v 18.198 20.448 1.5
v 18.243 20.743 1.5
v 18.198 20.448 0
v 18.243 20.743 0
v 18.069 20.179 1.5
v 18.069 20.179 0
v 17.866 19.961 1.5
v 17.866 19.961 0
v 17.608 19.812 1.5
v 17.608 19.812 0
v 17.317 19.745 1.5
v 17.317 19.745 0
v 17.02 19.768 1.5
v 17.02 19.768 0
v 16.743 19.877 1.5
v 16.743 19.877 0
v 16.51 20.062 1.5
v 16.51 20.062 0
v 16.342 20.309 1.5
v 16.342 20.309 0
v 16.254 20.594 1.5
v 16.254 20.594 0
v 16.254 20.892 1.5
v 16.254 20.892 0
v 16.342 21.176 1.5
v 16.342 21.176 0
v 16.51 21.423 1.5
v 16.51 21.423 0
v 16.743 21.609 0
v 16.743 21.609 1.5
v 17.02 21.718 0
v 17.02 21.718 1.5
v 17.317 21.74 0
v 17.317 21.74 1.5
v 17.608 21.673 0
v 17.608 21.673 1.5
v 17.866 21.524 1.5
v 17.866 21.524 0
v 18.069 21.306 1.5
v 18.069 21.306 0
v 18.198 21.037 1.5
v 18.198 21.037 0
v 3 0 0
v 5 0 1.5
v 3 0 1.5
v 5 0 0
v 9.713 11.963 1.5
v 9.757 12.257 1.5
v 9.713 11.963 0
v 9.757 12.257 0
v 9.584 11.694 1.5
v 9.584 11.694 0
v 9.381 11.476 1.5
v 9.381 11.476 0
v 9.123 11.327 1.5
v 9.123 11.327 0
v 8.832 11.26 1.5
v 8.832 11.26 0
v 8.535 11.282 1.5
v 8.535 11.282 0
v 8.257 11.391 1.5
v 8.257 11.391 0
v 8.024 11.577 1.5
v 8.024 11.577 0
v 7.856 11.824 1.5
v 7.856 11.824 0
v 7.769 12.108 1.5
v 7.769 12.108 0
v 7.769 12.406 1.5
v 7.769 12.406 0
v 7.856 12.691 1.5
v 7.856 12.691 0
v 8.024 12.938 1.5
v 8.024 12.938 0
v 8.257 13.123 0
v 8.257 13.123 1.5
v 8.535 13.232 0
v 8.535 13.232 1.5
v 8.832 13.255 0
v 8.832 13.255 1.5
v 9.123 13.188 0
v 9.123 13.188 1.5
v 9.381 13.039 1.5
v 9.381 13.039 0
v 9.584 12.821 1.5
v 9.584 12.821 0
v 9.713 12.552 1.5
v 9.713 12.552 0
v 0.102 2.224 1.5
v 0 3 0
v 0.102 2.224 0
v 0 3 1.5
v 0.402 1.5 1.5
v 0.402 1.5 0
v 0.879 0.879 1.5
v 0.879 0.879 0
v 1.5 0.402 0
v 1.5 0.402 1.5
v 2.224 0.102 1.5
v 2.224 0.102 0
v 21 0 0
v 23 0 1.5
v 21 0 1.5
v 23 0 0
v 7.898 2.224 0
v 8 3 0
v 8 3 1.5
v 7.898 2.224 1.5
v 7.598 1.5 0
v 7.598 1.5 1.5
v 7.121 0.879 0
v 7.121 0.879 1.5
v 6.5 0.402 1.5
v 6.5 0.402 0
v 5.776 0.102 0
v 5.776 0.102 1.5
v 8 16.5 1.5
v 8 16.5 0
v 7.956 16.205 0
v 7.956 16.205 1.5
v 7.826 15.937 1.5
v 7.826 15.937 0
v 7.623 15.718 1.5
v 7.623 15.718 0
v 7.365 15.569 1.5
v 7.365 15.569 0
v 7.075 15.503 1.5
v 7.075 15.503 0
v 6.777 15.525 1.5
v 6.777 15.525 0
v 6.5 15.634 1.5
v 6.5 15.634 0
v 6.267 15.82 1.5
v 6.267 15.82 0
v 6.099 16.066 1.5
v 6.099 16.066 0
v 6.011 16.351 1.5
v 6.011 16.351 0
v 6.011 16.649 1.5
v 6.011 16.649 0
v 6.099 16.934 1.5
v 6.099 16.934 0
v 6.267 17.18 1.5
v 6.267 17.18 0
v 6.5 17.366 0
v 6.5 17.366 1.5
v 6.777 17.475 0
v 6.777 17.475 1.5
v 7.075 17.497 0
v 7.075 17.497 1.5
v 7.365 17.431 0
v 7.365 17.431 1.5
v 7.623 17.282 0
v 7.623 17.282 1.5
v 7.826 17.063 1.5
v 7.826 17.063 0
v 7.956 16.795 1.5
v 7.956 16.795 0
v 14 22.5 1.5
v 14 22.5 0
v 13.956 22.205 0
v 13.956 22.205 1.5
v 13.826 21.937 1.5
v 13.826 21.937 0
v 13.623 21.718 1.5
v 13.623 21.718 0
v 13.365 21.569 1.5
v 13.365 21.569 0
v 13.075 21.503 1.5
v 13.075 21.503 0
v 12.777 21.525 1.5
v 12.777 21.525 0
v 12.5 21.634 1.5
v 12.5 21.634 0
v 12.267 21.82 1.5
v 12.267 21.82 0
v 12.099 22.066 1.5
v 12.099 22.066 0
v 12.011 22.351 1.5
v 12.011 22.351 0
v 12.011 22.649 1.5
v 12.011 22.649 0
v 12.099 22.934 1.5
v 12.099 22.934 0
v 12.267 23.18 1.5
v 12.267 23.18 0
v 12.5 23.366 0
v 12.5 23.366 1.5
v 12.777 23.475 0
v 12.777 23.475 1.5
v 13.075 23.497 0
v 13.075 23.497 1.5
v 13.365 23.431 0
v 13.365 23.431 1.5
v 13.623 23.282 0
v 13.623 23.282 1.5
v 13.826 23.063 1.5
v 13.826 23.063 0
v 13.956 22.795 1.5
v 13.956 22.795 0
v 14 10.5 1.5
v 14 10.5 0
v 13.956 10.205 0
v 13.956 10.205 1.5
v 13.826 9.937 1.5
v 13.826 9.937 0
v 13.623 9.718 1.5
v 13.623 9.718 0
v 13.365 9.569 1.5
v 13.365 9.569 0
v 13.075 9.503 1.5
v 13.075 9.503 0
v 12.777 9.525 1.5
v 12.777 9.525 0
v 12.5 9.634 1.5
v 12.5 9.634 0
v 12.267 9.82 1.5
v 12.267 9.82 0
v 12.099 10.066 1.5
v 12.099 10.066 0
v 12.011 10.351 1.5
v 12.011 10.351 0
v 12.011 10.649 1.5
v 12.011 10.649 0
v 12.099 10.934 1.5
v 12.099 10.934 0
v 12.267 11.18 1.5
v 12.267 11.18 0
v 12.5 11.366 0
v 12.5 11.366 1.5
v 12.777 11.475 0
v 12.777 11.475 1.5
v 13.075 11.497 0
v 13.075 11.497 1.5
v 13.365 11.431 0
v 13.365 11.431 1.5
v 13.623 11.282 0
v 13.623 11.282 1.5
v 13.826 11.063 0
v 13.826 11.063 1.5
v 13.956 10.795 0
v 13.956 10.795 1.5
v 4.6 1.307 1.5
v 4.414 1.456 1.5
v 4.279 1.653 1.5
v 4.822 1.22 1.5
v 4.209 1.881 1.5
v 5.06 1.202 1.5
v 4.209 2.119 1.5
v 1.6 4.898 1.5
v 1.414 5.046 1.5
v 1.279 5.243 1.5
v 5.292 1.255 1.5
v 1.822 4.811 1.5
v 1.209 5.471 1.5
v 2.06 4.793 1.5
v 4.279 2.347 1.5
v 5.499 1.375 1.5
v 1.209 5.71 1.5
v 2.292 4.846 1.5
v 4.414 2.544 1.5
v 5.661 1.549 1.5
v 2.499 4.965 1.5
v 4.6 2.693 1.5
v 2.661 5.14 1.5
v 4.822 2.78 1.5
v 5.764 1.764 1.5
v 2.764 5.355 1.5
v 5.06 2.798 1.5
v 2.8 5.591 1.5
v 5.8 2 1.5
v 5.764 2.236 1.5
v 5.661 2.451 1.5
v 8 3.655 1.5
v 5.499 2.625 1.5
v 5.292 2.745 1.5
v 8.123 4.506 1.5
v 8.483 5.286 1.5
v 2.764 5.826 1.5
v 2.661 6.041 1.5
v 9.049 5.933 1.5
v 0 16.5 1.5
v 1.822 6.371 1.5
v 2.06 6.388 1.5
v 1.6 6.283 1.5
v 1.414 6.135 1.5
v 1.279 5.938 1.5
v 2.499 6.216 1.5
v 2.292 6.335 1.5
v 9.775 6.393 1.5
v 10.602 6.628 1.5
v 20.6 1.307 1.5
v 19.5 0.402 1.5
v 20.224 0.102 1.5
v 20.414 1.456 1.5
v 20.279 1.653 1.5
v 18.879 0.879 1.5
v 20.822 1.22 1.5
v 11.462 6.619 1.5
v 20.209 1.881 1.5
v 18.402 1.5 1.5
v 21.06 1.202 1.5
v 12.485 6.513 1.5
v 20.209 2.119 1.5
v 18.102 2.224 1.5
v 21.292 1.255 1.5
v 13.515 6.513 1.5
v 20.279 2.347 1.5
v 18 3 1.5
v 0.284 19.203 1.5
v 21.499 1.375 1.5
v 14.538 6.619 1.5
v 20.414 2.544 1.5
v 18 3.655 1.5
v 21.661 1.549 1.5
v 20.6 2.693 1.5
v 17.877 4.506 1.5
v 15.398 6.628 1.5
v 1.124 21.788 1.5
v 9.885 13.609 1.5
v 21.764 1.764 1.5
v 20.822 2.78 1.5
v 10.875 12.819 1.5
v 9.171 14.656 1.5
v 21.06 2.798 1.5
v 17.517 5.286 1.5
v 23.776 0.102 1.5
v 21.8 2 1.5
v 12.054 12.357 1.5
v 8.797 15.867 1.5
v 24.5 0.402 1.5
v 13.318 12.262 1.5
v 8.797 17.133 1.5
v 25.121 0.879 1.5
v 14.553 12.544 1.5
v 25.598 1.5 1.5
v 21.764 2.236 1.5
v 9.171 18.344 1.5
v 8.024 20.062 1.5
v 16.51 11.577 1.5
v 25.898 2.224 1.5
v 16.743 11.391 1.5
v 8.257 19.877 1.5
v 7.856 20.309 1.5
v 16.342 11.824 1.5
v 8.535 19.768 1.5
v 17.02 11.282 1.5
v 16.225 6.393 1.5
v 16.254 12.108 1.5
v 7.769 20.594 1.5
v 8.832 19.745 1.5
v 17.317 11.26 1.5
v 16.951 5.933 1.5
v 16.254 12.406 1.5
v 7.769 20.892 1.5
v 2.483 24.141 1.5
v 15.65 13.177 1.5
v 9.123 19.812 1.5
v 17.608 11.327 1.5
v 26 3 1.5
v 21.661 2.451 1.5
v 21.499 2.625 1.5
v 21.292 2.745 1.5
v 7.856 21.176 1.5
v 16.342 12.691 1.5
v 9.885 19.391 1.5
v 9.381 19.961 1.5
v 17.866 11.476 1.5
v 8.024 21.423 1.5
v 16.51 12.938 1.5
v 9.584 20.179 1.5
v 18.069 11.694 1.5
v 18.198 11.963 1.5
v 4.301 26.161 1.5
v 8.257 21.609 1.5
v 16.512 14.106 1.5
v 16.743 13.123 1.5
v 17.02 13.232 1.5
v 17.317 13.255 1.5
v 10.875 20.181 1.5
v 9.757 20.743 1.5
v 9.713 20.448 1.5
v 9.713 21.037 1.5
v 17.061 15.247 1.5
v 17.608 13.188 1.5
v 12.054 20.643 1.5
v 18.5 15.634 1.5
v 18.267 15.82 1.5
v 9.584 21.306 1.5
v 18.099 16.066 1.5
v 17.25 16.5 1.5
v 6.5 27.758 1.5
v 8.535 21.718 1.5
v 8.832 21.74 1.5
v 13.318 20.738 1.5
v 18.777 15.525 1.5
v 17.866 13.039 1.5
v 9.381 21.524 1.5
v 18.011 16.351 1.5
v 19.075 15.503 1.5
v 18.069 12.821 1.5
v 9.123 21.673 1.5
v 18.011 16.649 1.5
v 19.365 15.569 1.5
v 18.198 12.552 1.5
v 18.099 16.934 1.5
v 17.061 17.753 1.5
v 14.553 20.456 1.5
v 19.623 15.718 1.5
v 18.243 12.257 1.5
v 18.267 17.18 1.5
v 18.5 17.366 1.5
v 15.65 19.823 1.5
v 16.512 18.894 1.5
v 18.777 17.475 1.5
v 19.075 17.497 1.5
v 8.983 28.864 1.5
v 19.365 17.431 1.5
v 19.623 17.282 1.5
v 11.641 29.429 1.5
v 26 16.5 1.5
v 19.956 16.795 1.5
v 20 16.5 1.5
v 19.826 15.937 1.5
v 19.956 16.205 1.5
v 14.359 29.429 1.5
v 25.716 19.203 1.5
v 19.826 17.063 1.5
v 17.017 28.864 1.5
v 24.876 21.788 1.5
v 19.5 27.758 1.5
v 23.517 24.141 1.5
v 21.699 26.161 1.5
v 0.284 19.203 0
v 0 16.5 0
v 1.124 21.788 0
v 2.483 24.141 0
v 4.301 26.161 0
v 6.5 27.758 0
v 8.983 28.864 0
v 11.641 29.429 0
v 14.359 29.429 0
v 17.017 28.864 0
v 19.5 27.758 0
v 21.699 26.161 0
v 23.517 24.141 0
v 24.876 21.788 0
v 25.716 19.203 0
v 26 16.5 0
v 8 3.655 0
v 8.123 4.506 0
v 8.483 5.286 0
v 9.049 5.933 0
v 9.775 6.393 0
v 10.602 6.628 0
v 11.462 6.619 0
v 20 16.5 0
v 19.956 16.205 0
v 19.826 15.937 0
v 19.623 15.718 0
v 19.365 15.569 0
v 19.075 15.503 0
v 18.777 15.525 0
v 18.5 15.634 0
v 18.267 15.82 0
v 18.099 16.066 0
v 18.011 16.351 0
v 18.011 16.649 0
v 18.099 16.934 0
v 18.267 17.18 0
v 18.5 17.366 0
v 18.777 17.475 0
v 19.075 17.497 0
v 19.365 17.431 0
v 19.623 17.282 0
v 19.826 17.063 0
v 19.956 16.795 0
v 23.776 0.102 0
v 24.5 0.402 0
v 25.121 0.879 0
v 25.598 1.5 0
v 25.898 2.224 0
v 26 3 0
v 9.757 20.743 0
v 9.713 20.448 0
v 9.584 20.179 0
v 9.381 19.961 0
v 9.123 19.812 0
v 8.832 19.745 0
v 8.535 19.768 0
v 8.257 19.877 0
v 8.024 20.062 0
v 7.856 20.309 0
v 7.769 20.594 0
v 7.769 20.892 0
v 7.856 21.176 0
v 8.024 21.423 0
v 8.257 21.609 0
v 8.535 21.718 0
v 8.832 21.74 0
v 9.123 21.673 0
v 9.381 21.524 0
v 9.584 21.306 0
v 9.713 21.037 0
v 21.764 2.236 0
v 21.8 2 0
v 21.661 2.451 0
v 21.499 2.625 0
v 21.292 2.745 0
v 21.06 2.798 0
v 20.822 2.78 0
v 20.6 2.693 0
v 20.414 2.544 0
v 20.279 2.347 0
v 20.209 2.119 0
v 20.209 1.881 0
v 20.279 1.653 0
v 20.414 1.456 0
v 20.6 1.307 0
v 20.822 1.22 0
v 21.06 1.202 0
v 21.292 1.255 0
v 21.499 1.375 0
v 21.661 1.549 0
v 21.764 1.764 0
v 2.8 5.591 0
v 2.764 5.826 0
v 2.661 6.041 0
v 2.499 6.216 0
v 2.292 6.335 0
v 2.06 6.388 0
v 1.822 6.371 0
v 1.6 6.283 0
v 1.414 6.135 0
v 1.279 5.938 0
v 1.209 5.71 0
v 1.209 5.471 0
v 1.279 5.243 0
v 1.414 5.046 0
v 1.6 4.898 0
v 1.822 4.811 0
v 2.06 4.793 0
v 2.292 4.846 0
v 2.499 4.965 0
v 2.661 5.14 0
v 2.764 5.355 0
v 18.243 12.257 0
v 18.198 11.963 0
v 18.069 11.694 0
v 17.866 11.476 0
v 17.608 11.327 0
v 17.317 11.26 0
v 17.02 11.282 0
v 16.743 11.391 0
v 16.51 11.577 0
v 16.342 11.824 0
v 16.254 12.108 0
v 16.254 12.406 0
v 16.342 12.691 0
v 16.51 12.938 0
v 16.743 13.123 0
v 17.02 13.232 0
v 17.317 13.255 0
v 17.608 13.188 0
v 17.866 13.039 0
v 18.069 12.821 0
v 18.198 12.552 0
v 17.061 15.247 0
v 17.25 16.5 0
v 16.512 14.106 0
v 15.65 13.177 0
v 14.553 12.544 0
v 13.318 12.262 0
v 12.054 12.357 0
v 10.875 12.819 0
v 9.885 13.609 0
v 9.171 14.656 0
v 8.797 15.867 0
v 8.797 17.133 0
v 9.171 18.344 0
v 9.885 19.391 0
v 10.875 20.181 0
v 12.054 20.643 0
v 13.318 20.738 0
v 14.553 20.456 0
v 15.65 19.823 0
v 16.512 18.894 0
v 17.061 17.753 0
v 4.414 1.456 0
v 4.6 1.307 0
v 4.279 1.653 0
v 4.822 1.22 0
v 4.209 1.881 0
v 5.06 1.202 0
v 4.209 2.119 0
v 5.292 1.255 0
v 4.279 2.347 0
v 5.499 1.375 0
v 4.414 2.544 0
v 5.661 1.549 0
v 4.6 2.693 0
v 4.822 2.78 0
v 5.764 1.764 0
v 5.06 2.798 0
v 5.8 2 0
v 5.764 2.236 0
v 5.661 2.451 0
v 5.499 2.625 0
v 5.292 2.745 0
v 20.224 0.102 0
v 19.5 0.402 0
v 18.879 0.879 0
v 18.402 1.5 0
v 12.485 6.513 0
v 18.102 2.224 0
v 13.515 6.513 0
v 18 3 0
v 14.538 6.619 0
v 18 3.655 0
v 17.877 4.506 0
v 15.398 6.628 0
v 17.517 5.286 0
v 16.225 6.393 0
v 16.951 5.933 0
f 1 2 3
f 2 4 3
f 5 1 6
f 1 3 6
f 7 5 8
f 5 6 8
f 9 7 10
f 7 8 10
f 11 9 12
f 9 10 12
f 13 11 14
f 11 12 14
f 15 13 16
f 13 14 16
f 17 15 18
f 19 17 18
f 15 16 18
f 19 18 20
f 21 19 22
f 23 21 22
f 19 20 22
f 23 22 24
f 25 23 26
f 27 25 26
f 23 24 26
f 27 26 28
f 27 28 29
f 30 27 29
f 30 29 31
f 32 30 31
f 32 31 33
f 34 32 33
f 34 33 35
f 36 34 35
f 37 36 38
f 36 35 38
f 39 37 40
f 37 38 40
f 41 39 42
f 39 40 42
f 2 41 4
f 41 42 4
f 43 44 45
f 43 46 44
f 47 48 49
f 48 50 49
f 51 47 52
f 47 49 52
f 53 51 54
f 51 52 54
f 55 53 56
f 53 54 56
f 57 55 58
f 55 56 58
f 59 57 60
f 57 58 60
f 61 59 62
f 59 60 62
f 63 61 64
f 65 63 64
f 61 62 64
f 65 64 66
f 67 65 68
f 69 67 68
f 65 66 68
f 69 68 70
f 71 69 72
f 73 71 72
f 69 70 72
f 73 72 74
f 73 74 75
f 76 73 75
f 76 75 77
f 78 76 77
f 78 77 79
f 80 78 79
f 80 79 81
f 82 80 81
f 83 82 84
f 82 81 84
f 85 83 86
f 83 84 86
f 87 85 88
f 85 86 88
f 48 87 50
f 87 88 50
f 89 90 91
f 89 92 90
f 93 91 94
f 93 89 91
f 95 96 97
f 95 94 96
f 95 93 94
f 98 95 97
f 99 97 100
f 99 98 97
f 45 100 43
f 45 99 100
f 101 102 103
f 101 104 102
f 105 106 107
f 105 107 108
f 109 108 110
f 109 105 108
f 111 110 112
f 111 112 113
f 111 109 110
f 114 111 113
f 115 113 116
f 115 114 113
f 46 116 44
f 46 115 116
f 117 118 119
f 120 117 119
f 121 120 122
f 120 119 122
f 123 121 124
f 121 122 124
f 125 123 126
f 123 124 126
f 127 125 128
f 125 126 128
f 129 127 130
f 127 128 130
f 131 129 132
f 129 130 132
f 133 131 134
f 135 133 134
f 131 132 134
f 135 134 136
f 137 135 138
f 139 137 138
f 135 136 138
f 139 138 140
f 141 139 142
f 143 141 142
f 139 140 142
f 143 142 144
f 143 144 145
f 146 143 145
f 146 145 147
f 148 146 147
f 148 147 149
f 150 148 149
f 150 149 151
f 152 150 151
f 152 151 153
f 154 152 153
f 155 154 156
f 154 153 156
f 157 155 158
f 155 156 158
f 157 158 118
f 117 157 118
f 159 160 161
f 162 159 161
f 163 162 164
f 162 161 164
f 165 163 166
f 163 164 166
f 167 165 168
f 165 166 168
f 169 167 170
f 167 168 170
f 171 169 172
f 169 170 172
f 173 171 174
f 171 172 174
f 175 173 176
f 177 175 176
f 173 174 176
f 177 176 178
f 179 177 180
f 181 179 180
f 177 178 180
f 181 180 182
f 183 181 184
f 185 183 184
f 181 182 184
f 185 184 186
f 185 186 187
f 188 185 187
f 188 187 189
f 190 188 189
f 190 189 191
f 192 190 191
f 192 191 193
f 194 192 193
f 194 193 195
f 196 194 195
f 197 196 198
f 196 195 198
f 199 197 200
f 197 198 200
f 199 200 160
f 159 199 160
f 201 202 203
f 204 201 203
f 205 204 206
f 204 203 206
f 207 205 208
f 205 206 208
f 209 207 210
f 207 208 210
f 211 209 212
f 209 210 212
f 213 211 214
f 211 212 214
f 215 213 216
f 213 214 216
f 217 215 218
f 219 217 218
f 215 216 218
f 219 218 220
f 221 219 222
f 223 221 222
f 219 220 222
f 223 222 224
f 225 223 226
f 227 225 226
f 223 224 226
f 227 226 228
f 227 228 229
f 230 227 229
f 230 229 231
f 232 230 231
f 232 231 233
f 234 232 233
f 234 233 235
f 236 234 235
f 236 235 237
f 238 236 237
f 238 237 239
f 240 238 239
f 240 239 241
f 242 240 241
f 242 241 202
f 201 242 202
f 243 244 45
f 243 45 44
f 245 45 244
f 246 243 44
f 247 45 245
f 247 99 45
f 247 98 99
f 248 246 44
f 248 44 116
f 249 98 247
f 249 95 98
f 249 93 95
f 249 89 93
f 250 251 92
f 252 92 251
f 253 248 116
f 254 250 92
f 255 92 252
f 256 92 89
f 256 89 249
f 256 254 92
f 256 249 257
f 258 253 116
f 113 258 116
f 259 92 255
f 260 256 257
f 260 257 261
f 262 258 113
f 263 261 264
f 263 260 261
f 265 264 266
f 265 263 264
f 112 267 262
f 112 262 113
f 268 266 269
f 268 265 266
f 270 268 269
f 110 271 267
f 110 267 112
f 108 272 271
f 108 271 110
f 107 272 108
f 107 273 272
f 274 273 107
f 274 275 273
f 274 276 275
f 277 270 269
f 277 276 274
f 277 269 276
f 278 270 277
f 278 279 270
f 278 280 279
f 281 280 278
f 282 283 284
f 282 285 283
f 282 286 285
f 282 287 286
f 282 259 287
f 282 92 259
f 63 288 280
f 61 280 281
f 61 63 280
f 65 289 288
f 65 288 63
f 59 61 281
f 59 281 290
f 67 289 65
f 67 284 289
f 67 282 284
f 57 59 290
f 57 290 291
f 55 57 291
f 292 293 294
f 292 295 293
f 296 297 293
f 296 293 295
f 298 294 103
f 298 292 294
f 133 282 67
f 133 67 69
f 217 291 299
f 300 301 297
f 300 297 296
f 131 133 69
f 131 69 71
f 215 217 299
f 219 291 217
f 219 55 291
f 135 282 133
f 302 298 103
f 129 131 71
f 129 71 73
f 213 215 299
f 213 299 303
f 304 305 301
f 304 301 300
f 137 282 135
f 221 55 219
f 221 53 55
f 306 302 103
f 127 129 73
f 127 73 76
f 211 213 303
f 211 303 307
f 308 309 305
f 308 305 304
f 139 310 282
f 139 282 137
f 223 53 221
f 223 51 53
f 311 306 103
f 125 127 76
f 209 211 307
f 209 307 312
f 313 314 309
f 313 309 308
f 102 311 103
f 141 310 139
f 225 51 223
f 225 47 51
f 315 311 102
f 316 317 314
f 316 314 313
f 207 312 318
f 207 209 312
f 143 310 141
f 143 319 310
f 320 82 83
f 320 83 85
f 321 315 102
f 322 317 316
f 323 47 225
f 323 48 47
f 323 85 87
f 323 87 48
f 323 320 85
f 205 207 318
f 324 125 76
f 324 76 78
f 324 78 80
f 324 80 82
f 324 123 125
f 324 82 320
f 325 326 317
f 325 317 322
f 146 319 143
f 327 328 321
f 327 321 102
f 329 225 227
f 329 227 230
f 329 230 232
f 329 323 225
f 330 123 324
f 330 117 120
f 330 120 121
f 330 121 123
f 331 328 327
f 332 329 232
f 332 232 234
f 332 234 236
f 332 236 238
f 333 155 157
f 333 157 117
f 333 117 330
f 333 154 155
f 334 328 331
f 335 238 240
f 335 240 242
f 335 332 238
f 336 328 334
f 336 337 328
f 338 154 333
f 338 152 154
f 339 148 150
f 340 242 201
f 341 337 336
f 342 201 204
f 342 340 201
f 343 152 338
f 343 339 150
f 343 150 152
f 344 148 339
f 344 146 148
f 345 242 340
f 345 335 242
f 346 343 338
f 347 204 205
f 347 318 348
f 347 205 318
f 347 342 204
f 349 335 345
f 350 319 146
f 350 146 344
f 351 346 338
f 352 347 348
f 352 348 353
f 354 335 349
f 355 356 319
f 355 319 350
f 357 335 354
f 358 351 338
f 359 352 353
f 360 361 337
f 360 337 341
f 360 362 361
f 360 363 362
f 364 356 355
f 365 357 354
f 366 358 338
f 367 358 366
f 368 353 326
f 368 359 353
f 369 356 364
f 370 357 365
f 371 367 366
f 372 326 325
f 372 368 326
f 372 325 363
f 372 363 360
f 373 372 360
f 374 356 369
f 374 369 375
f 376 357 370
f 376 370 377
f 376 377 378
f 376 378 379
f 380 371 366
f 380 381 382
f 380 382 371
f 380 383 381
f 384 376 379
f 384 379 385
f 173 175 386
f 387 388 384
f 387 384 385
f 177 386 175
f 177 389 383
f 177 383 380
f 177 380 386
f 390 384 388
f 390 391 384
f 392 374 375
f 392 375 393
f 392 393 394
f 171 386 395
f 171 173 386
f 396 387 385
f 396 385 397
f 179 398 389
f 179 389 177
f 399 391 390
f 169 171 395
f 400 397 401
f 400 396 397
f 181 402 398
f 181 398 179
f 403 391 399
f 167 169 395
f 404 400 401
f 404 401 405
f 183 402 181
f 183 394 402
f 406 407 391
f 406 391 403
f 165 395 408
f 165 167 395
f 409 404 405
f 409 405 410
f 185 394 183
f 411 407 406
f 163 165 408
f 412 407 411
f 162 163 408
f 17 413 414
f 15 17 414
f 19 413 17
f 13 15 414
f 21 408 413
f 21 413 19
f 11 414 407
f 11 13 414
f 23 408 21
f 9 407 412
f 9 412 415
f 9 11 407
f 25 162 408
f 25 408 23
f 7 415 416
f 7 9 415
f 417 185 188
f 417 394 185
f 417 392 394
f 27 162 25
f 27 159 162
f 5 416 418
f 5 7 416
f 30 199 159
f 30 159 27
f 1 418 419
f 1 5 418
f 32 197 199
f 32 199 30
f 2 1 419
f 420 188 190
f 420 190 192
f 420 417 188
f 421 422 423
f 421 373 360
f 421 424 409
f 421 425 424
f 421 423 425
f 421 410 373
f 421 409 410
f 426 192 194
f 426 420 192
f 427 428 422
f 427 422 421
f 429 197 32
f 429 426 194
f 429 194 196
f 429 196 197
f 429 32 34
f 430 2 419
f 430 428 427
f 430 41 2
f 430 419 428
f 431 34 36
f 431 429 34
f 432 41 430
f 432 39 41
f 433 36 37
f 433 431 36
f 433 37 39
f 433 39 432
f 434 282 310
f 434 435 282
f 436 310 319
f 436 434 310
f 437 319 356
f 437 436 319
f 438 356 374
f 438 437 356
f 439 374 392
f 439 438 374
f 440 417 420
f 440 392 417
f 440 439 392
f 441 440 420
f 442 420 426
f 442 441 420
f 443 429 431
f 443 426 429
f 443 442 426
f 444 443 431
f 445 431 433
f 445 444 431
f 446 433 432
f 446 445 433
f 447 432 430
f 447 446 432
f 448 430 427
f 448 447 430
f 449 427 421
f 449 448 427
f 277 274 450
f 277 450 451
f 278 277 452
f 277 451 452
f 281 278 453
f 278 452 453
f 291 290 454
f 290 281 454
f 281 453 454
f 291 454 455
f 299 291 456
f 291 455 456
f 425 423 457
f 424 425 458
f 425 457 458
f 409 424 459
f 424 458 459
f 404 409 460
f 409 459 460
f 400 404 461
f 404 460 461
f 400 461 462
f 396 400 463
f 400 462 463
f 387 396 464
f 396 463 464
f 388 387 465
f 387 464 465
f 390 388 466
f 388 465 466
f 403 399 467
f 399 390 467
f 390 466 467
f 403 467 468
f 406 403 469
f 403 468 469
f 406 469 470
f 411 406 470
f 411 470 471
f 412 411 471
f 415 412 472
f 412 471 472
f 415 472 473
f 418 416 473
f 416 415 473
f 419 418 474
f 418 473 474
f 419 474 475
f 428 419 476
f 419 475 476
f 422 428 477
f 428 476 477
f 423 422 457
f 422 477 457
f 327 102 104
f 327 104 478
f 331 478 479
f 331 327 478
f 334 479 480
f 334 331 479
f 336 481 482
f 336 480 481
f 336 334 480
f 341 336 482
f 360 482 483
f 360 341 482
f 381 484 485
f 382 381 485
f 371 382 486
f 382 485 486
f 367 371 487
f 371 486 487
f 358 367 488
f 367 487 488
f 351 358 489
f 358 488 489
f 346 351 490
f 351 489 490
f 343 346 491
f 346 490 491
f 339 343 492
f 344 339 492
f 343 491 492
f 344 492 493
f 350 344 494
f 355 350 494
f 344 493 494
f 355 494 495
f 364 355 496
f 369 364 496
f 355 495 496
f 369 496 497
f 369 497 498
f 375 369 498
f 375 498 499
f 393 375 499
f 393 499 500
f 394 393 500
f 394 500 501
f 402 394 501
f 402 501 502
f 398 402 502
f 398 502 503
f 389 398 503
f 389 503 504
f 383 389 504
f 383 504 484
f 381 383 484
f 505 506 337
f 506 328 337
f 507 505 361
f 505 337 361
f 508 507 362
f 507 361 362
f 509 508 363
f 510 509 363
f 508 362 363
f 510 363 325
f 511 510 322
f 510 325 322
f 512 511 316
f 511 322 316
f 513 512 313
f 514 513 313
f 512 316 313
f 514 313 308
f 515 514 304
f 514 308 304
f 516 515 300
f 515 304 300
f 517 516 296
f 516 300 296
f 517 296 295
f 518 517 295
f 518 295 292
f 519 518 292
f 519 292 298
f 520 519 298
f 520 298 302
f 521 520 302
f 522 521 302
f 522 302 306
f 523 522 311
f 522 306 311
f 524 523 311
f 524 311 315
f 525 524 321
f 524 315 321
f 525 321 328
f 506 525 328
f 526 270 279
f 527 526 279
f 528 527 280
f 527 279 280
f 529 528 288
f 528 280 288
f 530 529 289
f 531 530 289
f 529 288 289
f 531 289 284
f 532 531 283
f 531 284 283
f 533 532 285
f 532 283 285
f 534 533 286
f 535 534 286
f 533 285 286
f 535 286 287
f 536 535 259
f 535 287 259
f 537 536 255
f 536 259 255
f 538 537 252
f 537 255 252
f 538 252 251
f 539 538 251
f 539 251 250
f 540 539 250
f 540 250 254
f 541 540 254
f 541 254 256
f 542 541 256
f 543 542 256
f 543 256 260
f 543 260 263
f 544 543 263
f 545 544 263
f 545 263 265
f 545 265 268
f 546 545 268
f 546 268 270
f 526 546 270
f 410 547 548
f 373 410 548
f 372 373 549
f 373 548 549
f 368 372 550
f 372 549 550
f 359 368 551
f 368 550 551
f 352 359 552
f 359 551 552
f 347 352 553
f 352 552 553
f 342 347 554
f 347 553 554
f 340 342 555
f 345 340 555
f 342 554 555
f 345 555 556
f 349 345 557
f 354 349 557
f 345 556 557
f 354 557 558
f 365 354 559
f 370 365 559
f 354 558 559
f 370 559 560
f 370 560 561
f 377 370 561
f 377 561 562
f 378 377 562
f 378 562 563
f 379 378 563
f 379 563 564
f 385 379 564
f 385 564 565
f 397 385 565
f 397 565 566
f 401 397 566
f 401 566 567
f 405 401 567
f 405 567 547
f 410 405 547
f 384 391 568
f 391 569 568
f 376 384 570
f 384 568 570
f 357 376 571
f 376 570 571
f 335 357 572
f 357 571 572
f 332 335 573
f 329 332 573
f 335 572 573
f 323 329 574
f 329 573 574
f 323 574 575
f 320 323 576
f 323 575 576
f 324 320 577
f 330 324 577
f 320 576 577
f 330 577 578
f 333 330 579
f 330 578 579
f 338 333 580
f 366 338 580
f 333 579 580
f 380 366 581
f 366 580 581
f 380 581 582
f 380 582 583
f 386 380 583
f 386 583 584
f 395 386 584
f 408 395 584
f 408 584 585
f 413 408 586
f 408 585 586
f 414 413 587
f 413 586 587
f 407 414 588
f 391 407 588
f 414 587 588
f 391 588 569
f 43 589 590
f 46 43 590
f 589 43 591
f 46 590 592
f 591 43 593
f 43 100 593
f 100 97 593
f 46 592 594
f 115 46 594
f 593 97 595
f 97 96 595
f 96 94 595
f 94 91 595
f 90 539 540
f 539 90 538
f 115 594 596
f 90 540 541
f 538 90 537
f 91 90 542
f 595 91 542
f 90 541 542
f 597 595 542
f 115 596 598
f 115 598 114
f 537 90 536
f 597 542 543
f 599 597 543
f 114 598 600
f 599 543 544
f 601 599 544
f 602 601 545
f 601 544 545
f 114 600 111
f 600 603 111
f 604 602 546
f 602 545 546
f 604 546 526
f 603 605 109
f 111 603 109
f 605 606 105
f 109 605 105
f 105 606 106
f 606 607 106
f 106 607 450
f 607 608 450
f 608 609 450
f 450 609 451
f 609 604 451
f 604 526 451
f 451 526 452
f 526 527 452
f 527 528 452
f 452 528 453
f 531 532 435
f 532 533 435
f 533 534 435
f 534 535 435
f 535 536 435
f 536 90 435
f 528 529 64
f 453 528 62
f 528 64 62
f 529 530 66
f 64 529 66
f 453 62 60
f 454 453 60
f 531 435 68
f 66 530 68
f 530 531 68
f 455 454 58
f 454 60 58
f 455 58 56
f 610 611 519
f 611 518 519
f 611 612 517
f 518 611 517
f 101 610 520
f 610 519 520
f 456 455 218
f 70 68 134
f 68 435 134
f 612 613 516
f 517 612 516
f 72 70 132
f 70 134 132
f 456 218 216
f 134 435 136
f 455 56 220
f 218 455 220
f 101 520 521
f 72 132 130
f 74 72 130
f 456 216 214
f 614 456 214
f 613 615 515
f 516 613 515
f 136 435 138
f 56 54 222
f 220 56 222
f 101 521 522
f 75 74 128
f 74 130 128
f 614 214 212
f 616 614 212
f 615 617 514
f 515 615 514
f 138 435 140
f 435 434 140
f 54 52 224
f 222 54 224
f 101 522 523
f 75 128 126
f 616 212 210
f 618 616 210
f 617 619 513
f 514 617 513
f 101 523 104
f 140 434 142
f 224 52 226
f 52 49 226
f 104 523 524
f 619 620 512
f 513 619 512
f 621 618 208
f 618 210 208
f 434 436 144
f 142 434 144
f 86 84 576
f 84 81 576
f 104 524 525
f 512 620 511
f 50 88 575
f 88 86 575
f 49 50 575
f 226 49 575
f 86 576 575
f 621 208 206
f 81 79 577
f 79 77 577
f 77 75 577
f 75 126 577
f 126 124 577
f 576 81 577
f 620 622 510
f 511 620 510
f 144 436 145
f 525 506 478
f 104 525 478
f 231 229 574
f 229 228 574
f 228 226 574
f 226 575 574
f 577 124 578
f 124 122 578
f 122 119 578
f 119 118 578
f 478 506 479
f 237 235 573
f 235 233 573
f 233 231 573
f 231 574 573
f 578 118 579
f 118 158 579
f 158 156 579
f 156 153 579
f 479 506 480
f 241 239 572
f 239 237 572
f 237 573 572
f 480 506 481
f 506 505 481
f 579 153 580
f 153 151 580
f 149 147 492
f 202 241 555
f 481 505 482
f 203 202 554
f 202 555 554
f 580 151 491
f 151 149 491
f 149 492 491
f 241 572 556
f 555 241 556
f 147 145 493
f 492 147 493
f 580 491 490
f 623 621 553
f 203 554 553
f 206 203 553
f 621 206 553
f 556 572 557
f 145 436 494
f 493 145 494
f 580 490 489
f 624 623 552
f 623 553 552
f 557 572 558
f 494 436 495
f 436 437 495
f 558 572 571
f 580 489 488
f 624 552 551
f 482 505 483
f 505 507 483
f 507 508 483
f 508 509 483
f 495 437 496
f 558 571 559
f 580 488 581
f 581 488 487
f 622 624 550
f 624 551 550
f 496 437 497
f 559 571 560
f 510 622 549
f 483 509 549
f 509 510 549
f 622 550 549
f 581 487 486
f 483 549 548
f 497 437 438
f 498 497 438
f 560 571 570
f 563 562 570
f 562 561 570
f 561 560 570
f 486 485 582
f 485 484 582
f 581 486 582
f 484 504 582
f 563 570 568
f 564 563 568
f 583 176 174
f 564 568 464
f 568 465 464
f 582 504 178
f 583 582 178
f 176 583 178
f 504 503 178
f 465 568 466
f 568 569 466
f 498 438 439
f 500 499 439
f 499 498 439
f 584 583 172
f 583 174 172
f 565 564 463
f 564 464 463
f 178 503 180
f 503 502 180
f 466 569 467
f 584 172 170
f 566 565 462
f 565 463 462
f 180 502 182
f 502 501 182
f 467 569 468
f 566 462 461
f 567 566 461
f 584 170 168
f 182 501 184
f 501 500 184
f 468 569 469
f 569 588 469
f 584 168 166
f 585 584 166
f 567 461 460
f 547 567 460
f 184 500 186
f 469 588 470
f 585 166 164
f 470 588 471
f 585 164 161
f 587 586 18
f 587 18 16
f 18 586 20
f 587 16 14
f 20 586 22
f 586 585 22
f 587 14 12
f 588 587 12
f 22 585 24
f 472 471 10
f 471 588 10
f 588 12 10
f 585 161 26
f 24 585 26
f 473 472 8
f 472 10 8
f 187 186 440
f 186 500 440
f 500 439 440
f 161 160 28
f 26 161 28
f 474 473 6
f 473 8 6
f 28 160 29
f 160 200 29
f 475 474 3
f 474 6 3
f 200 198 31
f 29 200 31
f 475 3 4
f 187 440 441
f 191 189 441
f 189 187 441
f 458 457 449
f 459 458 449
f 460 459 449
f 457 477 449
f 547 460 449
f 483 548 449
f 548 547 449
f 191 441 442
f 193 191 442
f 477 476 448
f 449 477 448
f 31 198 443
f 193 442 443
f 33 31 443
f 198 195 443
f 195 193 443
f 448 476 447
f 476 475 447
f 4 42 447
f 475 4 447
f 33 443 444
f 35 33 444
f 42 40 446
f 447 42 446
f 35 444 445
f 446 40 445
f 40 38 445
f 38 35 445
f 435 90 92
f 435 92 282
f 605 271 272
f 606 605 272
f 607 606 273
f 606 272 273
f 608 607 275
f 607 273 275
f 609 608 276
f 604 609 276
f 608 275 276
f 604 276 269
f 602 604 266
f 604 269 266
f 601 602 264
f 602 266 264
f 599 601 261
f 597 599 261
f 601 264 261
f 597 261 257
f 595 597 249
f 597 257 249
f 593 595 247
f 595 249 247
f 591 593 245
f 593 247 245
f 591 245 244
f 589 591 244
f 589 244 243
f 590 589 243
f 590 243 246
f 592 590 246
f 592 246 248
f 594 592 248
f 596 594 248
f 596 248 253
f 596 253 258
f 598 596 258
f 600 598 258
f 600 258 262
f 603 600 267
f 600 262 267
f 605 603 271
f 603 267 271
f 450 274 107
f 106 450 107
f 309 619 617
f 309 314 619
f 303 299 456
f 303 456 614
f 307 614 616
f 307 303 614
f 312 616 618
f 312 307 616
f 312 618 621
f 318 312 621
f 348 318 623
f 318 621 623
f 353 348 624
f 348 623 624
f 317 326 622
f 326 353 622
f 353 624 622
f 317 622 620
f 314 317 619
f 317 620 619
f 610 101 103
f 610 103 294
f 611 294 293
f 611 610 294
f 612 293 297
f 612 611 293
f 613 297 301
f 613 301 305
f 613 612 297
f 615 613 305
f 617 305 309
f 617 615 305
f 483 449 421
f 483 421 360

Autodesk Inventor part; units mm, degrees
ref_plane "YZ Plane" through (0, 0, 0) normal (1, 0, 0) x (0, 1, 0)
ref_plane "XZ Plane" through (0, 0, 0) normal (0, 1, 0) x (-1, 0, 0)
ref_plane "XY Plane" through (0, 0, 0) normal (0, 0, 1) x (1, 0, 0)
sketch "スケッチ1" plane through (0, 0, 0) normal (0, 0, 1) x (1, 0, 0)
  line L0 (0, 16.5) -> (26, 16.5)
  line L1 (26, 16.5) -> (26, 0)
  line L2 (26, 0) -> (0, 0)
  line L3 (0, 0) -> (0, 16.5)
  circle A0 centre (13, 16.5) radius 13
  circle A1 centre (13, 16.5) radius 4.25
  circle A2 centre (13, 16.5) radius 6
  circle A3 centre (13, 22.5) radius 1
  circle A4 centre (8.7574, 20.7426) radius 1
  circle A5 centre (7, 16.5) radius 1
  circle A6 centre (8.7574, 12.2574) radius 1
  circle A7 centre (13, 10.5) radius 1
  circle A8 centre (17.2426, 12.2574) radius 1
  circle A9 centre (19, 16.5) radius 1
  circle A10 centre (17.2426, 20.7426) radius 1
  point P0 (0, 16.5)
  point P1 (26, 16.5)
  dimension "d3" = 12
  dimension "d0" = 16.5
  dimension "d1" = 26
  dimension "d2" = 8.5
  dimension "d4" = 2
  dimension "d7" = 360
extrude "押し出し1" add sketch "スケッチ1" along normal blind 1.5 contours A9 A2 A10 A3 A4 A5 L0 A0 | L0 A0 A5 A2 A6 A7 A8 A9 | A9 A2 A8 A7 A6 A5 L0 A1 | L0 A1 A5 A2 A4 A3 A10 A9 | L1 L2 L3 A0
sketch "スケッチ2" plane through (0, 0, 1.5) normal (0, 0, 1) x (1, 0, 0)
  circle A0 centre (2, 5.5906) radius 0.8 projected
  circle A1 centre (5, 2) radius 0.8 projected
  circle A2 centre (21, 2) radius 0.8 projected
  circle A3 centre (13, 16.5) radius 4.25 projected
  circle A4 centre (13, 16.5) radius 10
  line L0 (0, 0) -> (26, 0) projected
  line L1 (8, 7.8397) -> (8, 0)
  line L2 (18, 7.8397) -> (18, 0)
  point P0 (2, 0)
  point P1 (24, 0)
  dimension "d14" = 20
  dimension "d16" = 3
  dimension "d17" = 3
extrude "押し出し2" cut sketch "スケッチ2" against normal through all contours A0 | A1 | A2 | A4 L2 L0 L1
fillet "フィレット2" radius 3 6 edges at (0, 0, 0.75) (8, 0, 0.75) (8, 7.8397, 0.75) (18, 7.8397, 0.75) (18, 0, 0.75) (26, 0, 0.75)
properties part number "hipjoint_toleg_upper" material "アルミニウム 6061"
